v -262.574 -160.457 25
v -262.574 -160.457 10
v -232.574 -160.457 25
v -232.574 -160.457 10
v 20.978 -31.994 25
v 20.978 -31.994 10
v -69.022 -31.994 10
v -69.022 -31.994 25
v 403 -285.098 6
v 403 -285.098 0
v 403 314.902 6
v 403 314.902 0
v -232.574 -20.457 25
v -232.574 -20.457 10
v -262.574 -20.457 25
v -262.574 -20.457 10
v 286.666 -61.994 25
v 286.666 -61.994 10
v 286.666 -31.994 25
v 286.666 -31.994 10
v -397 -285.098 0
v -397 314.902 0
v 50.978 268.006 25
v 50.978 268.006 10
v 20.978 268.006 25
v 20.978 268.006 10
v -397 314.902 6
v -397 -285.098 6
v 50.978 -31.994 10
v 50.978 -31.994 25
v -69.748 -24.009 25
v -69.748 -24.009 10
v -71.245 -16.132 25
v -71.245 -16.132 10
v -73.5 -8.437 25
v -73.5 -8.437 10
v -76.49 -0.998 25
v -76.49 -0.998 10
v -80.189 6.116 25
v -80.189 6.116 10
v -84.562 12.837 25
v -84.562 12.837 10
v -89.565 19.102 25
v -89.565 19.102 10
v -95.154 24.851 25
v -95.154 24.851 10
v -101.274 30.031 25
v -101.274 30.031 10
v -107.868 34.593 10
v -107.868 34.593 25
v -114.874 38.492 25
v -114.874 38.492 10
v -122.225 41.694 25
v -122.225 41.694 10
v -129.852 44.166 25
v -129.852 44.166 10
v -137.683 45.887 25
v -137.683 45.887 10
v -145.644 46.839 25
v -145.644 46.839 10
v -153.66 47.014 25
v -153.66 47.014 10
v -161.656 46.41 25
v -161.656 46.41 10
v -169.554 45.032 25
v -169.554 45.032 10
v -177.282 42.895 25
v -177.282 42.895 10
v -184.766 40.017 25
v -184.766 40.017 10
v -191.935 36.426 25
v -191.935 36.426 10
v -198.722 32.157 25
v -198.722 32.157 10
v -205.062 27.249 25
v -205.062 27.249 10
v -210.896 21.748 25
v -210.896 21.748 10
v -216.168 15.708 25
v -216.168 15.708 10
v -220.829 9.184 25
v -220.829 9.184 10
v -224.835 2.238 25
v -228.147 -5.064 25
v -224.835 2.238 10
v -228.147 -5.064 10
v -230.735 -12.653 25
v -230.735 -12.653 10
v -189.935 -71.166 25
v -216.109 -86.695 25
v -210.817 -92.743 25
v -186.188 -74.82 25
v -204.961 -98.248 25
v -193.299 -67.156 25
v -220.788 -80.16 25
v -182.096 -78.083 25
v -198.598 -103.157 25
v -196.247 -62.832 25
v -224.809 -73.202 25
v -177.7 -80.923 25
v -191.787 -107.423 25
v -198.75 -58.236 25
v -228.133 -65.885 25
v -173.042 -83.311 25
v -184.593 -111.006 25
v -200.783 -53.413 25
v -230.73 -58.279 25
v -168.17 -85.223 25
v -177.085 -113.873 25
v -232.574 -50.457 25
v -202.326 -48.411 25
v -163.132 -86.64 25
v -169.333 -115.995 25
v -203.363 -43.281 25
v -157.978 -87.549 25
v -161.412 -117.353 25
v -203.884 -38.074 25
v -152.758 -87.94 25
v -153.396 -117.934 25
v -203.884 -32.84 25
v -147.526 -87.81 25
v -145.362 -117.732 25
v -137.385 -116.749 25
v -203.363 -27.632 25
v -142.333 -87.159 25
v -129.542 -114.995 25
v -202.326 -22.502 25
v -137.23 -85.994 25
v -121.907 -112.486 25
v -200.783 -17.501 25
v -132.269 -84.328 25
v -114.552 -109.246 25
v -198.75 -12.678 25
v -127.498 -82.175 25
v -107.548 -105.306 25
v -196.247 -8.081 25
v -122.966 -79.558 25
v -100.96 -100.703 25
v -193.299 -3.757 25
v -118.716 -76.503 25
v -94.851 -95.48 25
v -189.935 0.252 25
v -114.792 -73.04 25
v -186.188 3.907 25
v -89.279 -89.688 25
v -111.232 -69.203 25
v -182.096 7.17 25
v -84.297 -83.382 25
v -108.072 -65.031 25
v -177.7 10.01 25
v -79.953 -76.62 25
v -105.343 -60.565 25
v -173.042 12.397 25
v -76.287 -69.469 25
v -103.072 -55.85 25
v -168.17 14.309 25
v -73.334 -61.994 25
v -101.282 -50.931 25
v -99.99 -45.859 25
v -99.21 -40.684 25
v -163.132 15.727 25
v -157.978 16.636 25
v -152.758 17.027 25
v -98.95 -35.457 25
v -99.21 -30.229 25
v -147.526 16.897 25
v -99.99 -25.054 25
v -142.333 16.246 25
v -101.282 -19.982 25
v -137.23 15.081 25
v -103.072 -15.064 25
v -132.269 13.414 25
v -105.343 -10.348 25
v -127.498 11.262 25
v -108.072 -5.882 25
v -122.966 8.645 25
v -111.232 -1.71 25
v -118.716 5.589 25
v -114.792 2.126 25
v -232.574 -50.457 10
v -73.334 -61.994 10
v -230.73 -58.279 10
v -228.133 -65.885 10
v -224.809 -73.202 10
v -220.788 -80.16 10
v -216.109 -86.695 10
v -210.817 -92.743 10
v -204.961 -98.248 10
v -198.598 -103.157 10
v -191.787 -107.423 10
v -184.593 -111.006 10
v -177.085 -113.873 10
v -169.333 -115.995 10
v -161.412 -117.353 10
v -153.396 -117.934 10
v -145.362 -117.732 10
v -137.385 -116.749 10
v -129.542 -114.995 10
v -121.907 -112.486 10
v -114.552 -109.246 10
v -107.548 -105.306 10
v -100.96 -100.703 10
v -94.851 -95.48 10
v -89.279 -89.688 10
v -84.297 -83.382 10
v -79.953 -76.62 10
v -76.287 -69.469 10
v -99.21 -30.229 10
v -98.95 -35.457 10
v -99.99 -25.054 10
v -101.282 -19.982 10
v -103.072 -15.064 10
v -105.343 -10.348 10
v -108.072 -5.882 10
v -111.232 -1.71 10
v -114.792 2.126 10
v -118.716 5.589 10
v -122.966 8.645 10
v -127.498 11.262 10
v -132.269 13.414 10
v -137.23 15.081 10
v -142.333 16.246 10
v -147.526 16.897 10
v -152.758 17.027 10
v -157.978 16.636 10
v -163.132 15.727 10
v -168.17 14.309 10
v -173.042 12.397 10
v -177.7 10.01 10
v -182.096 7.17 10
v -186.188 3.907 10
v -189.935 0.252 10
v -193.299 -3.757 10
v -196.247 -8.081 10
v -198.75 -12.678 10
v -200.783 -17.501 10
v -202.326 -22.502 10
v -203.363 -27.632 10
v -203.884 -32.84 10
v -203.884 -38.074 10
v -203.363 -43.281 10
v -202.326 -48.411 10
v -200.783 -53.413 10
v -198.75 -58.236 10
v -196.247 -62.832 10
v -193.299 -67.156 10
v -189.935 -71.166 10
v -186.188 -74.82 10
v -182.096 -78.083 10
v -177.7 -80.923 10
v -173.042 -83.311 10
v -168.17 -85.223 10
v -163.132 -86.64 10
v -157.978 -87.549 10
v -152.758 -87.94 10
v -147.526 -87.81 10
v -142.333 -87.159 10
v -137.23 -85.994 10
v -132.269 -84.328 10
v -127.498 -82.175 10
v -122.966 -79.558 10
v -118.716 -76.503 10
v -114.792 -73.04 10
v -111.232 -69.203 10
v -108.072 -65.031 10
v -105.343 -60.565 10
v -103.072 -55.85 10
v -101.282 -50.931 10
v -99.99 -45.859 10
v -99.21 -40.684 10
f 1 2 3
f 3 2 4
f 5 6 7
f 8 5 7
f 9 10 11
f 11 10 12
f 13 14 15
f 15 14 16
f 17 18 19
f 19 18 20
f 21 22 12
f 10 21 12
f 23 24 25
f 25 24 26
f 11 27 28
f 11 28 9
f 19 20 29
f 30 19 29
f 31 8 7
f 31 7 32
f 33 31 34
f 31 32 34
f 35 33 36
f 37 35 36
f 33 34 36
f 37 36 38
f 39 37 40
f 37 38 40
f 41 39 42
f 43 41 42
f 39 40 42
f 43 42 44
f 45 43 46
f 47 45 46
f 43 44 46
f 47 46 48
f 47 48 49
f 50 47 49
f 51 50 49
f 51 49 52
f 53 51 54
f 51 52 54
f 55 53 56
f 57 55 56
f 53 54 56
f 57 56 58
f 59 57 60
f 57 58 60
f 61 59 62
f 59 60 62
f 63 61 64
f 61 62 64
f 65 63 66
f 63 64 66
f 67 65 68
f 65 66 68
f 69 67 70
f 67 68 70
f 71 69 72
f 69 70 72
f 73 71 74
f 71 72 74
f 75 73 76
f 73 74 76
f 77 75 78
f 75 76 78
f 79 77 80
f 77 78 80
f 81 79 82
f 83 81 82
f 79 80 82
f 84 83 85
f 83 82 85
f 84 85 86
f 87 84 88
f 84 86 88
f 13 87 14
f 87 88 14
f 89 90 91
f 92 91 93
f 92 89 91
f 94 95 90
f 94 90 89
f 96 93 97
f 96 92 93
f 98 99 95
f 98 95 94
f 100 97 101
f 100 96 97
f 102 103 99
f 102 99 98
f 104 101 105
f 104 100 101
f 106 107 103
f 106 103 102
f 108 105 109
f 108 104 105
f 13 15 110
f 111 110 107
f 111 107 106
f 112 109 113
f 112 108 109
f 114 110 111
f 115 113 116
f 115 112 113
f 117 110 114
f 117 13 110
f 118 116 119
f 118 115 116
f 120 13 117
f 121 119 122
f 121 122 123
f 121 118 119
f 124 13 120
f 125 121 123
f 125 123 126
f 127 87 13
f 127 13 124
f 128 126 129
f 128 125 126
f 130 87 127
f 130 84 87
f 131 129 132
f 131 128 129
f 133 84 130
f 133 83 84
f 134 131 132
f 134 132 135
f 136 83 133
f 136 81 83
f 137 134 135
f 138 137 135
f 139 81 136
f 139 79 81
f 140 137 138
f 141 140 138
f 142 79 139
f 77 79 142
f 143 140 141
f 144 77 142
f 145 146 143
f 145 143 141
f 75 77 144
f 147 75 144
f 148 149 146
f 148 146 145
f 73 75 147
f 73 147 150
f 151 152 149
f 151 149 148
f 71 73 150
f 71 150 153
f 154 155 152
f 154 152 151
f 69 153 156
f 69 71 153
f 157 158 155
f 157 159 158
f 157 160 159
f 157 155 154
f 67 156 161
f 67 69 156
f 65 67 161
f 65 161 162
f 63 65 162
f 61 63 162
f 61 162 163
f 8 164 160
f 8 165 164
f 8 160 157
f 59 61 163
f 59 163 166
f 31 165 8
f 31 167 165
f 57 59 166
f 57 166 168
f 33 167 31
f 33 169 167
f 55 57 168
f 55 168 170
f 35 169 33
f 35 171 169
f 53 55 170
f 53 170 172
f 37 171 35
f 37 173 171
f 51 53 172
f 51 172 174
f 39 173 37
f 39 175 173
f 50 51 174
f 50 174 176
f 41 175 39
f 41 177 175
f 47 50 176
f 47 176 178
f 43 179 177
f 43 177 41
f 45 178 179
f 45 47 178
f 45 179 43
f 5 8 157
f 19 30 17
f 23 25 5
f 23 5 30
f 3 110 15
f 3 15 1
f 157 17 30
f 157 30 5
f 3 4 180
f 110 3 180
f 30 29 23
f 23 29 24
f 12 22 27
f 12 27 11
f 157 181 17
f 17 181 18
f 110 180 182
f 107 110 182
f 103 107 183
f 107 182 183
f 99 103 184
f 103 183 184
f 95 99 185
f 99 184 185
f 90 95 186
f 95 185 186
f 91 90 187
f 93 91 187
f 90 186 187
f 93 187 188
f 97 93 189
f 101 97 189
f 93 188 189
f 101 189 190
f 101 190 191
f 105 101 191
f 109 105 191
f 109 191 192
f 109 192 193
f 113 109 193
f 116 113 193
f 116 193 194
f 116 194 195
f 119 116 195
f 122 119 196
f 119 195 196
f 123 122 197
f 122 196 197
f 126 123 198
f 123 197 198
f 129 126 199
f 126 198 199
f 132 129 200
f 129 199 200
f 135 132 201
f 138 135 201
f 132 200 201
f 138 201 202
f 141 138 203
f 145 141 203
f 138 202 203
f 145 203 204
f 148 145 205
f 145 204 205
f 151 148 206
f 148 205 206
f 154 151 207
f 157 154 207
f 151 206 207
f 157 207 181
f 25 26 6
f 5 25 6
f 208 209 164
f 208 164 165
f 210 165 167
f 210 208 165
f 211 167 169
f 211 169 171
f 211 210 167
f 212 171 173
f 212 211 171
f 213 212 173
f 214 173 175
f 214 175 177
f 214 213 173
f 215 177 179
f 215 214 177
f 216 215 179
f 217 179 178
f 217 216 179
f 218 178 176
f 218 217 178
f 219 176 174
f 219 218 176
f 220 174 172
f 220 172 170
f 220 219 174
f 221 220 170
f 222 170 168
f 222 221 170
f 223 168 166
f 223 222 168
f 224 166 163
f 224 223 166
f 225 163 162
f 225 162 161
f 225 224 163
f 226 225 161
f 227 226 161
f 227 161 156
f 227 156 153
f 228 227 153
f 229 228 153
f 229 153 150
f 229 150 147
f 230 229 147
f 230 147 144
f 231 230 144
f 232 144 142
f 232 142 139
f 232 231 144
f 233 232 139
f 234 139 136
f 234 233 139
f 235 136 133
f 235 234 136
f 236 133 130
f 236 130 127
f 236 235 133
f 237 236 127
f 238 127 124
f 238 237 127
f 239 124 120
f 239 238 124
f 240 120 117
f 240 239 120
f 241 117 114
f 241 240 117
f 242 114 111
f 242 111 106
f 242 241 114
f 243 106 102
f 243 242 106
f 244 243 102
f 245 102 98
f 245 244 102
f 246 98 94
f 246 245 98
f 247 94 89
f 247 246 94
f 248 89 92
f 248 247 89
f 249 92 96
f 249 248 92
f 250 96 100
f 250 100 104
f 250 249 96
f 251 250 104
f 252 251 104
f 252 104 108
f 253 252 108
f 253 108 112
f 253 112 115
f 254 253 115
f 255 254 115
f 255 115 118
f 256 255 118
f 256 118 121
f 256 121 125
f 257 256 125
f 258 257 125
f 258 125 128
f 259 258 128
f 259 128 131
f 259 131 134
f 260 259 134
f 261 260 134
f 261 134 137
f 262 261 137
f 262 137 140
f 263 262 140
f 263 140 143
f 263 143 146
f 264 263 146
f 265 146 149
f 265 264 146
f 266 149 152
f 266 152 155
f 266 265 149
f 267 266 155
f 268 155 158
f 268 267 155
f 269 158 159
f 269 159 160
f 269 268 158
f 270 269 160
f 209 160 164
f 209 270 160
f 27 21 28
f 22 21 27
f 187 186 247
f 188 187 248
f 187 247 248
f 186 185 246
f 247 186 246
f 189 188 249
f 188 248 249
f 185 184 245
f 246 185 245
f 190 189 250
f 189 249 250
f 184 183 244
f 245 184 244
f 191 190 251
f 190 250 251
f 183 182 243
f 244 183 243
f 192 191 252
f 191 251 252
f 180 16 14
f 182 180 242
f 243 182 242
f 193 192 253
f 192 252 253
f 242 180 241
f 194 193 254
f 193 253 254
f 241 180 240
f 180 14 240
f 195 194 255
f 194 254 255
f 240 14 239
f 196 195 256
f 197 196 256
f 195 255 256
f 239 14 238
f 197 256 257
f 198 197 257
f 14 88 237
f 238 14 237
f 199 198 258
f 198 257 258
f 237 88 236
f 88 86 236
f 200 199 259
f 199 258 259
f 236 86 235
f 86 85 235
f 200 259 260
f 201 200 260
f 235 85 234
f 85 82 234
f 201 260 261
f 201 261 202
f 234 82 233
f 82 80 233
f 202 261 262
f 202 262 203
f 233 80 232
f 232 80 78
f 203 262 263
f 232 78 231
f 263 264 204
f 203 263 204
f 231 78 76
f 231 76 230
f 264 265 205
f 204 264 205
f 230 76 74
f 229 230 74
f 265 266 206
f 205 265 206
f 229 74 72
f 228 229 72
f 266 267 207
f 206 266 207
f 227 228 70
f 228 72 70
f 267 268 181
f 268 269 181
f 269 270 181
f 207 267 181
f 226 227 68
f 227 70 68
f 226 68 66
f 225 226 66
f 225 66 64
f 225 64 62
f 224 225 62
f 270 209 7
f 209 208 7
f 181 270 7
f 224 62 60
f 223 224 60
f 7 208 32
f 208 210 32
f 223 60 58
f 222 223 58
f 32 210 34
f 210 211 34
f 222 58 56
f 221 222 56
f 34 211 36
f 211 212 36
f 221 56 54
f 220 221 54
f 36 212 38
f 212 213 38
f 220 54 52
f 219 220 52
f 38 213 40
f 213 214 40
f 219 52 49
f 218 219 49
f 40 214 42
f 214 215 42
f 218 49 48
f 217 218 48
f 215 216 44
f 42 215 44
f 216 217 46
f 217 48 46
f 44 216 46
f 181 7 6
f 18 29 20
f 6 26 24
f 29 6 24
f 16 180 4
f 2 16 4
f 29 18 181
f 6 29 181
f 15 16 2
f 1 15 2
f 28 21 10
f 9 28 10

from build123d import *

# Parameters (mm, degrees)
F0_W     = 800
F0_H     = 600
F1_DEPTH = 6
F3_START = 10
F2_R     = 52.5
F3_DEPTH = 15


with BuildPart() as f1:
    # F0 (on Top) → F1 (new body)
    with BuildSketch(Plane.XY):
        with Locations((3.0003070796, 14.9015896022)):
            Rectangle(F0_W, F0_H)
    extrude(amount=F1_DEPTH)


with BuildPart() as f3:
    # F2 (on Top) → F3 (new body)
    with BuildSketch(Plane.XY.offset(F3_START)):
        with BuildLine():
            Line((-262.5744263002, -20.4566953906), (-262.5744263002, -160.4566953906))
            Line((-262.5744263002, -160.4566953906), (-232.5744263002, -160.4566953906))
            Line((-232.5744263002, -160.4566953906), (-232.5744263002, -50.4566953906))
            ThreePointArc((-232.5744263002, -50.4566953906), (-157.4110656341, -117.7410195641), (-73.3340005135, -61.9937488971))
            Line((-73.3340005135, -61.9937488971), (286.6659994865, -61.9937488971))
            Line((286.6659994865, -61.9937488971), (286.6659994865, -31.9937488971))
            Line((286.6659994865, -31.9937488971), (50.9777665779, -31.9937488971))
            Line((50.9777665779, -31.9937488971), (50.9777665779, 268.0062511029))
            Line((50.9777665779, 268.0062511029), (20.9777665779, 268.0062511029))
            Line((20.9777665779, 268.0062511029), (20.9777665779, -31.9937488971))
            Line((20.9777665779, -31.9937488971), (-69.0222334221, -31.9937488971))
            ThreePointArc((-69.0222334221, -31.9937488971), (-145.6443565505, 46.8388090255), (-232.5744263002, -20.4566953906))
            Line((-232.5744263002, -20.4566953906), (-262.5744263002, -20.4566953906))
        make_face()
        with Locations((-151.4495226022, -35.4566953906)):
            Circle(F2_R, mode=Mode.SUBTRACT)
    extrude(amount=F3_DEPTH)


solid = Compound([f1.part, f3.part])
